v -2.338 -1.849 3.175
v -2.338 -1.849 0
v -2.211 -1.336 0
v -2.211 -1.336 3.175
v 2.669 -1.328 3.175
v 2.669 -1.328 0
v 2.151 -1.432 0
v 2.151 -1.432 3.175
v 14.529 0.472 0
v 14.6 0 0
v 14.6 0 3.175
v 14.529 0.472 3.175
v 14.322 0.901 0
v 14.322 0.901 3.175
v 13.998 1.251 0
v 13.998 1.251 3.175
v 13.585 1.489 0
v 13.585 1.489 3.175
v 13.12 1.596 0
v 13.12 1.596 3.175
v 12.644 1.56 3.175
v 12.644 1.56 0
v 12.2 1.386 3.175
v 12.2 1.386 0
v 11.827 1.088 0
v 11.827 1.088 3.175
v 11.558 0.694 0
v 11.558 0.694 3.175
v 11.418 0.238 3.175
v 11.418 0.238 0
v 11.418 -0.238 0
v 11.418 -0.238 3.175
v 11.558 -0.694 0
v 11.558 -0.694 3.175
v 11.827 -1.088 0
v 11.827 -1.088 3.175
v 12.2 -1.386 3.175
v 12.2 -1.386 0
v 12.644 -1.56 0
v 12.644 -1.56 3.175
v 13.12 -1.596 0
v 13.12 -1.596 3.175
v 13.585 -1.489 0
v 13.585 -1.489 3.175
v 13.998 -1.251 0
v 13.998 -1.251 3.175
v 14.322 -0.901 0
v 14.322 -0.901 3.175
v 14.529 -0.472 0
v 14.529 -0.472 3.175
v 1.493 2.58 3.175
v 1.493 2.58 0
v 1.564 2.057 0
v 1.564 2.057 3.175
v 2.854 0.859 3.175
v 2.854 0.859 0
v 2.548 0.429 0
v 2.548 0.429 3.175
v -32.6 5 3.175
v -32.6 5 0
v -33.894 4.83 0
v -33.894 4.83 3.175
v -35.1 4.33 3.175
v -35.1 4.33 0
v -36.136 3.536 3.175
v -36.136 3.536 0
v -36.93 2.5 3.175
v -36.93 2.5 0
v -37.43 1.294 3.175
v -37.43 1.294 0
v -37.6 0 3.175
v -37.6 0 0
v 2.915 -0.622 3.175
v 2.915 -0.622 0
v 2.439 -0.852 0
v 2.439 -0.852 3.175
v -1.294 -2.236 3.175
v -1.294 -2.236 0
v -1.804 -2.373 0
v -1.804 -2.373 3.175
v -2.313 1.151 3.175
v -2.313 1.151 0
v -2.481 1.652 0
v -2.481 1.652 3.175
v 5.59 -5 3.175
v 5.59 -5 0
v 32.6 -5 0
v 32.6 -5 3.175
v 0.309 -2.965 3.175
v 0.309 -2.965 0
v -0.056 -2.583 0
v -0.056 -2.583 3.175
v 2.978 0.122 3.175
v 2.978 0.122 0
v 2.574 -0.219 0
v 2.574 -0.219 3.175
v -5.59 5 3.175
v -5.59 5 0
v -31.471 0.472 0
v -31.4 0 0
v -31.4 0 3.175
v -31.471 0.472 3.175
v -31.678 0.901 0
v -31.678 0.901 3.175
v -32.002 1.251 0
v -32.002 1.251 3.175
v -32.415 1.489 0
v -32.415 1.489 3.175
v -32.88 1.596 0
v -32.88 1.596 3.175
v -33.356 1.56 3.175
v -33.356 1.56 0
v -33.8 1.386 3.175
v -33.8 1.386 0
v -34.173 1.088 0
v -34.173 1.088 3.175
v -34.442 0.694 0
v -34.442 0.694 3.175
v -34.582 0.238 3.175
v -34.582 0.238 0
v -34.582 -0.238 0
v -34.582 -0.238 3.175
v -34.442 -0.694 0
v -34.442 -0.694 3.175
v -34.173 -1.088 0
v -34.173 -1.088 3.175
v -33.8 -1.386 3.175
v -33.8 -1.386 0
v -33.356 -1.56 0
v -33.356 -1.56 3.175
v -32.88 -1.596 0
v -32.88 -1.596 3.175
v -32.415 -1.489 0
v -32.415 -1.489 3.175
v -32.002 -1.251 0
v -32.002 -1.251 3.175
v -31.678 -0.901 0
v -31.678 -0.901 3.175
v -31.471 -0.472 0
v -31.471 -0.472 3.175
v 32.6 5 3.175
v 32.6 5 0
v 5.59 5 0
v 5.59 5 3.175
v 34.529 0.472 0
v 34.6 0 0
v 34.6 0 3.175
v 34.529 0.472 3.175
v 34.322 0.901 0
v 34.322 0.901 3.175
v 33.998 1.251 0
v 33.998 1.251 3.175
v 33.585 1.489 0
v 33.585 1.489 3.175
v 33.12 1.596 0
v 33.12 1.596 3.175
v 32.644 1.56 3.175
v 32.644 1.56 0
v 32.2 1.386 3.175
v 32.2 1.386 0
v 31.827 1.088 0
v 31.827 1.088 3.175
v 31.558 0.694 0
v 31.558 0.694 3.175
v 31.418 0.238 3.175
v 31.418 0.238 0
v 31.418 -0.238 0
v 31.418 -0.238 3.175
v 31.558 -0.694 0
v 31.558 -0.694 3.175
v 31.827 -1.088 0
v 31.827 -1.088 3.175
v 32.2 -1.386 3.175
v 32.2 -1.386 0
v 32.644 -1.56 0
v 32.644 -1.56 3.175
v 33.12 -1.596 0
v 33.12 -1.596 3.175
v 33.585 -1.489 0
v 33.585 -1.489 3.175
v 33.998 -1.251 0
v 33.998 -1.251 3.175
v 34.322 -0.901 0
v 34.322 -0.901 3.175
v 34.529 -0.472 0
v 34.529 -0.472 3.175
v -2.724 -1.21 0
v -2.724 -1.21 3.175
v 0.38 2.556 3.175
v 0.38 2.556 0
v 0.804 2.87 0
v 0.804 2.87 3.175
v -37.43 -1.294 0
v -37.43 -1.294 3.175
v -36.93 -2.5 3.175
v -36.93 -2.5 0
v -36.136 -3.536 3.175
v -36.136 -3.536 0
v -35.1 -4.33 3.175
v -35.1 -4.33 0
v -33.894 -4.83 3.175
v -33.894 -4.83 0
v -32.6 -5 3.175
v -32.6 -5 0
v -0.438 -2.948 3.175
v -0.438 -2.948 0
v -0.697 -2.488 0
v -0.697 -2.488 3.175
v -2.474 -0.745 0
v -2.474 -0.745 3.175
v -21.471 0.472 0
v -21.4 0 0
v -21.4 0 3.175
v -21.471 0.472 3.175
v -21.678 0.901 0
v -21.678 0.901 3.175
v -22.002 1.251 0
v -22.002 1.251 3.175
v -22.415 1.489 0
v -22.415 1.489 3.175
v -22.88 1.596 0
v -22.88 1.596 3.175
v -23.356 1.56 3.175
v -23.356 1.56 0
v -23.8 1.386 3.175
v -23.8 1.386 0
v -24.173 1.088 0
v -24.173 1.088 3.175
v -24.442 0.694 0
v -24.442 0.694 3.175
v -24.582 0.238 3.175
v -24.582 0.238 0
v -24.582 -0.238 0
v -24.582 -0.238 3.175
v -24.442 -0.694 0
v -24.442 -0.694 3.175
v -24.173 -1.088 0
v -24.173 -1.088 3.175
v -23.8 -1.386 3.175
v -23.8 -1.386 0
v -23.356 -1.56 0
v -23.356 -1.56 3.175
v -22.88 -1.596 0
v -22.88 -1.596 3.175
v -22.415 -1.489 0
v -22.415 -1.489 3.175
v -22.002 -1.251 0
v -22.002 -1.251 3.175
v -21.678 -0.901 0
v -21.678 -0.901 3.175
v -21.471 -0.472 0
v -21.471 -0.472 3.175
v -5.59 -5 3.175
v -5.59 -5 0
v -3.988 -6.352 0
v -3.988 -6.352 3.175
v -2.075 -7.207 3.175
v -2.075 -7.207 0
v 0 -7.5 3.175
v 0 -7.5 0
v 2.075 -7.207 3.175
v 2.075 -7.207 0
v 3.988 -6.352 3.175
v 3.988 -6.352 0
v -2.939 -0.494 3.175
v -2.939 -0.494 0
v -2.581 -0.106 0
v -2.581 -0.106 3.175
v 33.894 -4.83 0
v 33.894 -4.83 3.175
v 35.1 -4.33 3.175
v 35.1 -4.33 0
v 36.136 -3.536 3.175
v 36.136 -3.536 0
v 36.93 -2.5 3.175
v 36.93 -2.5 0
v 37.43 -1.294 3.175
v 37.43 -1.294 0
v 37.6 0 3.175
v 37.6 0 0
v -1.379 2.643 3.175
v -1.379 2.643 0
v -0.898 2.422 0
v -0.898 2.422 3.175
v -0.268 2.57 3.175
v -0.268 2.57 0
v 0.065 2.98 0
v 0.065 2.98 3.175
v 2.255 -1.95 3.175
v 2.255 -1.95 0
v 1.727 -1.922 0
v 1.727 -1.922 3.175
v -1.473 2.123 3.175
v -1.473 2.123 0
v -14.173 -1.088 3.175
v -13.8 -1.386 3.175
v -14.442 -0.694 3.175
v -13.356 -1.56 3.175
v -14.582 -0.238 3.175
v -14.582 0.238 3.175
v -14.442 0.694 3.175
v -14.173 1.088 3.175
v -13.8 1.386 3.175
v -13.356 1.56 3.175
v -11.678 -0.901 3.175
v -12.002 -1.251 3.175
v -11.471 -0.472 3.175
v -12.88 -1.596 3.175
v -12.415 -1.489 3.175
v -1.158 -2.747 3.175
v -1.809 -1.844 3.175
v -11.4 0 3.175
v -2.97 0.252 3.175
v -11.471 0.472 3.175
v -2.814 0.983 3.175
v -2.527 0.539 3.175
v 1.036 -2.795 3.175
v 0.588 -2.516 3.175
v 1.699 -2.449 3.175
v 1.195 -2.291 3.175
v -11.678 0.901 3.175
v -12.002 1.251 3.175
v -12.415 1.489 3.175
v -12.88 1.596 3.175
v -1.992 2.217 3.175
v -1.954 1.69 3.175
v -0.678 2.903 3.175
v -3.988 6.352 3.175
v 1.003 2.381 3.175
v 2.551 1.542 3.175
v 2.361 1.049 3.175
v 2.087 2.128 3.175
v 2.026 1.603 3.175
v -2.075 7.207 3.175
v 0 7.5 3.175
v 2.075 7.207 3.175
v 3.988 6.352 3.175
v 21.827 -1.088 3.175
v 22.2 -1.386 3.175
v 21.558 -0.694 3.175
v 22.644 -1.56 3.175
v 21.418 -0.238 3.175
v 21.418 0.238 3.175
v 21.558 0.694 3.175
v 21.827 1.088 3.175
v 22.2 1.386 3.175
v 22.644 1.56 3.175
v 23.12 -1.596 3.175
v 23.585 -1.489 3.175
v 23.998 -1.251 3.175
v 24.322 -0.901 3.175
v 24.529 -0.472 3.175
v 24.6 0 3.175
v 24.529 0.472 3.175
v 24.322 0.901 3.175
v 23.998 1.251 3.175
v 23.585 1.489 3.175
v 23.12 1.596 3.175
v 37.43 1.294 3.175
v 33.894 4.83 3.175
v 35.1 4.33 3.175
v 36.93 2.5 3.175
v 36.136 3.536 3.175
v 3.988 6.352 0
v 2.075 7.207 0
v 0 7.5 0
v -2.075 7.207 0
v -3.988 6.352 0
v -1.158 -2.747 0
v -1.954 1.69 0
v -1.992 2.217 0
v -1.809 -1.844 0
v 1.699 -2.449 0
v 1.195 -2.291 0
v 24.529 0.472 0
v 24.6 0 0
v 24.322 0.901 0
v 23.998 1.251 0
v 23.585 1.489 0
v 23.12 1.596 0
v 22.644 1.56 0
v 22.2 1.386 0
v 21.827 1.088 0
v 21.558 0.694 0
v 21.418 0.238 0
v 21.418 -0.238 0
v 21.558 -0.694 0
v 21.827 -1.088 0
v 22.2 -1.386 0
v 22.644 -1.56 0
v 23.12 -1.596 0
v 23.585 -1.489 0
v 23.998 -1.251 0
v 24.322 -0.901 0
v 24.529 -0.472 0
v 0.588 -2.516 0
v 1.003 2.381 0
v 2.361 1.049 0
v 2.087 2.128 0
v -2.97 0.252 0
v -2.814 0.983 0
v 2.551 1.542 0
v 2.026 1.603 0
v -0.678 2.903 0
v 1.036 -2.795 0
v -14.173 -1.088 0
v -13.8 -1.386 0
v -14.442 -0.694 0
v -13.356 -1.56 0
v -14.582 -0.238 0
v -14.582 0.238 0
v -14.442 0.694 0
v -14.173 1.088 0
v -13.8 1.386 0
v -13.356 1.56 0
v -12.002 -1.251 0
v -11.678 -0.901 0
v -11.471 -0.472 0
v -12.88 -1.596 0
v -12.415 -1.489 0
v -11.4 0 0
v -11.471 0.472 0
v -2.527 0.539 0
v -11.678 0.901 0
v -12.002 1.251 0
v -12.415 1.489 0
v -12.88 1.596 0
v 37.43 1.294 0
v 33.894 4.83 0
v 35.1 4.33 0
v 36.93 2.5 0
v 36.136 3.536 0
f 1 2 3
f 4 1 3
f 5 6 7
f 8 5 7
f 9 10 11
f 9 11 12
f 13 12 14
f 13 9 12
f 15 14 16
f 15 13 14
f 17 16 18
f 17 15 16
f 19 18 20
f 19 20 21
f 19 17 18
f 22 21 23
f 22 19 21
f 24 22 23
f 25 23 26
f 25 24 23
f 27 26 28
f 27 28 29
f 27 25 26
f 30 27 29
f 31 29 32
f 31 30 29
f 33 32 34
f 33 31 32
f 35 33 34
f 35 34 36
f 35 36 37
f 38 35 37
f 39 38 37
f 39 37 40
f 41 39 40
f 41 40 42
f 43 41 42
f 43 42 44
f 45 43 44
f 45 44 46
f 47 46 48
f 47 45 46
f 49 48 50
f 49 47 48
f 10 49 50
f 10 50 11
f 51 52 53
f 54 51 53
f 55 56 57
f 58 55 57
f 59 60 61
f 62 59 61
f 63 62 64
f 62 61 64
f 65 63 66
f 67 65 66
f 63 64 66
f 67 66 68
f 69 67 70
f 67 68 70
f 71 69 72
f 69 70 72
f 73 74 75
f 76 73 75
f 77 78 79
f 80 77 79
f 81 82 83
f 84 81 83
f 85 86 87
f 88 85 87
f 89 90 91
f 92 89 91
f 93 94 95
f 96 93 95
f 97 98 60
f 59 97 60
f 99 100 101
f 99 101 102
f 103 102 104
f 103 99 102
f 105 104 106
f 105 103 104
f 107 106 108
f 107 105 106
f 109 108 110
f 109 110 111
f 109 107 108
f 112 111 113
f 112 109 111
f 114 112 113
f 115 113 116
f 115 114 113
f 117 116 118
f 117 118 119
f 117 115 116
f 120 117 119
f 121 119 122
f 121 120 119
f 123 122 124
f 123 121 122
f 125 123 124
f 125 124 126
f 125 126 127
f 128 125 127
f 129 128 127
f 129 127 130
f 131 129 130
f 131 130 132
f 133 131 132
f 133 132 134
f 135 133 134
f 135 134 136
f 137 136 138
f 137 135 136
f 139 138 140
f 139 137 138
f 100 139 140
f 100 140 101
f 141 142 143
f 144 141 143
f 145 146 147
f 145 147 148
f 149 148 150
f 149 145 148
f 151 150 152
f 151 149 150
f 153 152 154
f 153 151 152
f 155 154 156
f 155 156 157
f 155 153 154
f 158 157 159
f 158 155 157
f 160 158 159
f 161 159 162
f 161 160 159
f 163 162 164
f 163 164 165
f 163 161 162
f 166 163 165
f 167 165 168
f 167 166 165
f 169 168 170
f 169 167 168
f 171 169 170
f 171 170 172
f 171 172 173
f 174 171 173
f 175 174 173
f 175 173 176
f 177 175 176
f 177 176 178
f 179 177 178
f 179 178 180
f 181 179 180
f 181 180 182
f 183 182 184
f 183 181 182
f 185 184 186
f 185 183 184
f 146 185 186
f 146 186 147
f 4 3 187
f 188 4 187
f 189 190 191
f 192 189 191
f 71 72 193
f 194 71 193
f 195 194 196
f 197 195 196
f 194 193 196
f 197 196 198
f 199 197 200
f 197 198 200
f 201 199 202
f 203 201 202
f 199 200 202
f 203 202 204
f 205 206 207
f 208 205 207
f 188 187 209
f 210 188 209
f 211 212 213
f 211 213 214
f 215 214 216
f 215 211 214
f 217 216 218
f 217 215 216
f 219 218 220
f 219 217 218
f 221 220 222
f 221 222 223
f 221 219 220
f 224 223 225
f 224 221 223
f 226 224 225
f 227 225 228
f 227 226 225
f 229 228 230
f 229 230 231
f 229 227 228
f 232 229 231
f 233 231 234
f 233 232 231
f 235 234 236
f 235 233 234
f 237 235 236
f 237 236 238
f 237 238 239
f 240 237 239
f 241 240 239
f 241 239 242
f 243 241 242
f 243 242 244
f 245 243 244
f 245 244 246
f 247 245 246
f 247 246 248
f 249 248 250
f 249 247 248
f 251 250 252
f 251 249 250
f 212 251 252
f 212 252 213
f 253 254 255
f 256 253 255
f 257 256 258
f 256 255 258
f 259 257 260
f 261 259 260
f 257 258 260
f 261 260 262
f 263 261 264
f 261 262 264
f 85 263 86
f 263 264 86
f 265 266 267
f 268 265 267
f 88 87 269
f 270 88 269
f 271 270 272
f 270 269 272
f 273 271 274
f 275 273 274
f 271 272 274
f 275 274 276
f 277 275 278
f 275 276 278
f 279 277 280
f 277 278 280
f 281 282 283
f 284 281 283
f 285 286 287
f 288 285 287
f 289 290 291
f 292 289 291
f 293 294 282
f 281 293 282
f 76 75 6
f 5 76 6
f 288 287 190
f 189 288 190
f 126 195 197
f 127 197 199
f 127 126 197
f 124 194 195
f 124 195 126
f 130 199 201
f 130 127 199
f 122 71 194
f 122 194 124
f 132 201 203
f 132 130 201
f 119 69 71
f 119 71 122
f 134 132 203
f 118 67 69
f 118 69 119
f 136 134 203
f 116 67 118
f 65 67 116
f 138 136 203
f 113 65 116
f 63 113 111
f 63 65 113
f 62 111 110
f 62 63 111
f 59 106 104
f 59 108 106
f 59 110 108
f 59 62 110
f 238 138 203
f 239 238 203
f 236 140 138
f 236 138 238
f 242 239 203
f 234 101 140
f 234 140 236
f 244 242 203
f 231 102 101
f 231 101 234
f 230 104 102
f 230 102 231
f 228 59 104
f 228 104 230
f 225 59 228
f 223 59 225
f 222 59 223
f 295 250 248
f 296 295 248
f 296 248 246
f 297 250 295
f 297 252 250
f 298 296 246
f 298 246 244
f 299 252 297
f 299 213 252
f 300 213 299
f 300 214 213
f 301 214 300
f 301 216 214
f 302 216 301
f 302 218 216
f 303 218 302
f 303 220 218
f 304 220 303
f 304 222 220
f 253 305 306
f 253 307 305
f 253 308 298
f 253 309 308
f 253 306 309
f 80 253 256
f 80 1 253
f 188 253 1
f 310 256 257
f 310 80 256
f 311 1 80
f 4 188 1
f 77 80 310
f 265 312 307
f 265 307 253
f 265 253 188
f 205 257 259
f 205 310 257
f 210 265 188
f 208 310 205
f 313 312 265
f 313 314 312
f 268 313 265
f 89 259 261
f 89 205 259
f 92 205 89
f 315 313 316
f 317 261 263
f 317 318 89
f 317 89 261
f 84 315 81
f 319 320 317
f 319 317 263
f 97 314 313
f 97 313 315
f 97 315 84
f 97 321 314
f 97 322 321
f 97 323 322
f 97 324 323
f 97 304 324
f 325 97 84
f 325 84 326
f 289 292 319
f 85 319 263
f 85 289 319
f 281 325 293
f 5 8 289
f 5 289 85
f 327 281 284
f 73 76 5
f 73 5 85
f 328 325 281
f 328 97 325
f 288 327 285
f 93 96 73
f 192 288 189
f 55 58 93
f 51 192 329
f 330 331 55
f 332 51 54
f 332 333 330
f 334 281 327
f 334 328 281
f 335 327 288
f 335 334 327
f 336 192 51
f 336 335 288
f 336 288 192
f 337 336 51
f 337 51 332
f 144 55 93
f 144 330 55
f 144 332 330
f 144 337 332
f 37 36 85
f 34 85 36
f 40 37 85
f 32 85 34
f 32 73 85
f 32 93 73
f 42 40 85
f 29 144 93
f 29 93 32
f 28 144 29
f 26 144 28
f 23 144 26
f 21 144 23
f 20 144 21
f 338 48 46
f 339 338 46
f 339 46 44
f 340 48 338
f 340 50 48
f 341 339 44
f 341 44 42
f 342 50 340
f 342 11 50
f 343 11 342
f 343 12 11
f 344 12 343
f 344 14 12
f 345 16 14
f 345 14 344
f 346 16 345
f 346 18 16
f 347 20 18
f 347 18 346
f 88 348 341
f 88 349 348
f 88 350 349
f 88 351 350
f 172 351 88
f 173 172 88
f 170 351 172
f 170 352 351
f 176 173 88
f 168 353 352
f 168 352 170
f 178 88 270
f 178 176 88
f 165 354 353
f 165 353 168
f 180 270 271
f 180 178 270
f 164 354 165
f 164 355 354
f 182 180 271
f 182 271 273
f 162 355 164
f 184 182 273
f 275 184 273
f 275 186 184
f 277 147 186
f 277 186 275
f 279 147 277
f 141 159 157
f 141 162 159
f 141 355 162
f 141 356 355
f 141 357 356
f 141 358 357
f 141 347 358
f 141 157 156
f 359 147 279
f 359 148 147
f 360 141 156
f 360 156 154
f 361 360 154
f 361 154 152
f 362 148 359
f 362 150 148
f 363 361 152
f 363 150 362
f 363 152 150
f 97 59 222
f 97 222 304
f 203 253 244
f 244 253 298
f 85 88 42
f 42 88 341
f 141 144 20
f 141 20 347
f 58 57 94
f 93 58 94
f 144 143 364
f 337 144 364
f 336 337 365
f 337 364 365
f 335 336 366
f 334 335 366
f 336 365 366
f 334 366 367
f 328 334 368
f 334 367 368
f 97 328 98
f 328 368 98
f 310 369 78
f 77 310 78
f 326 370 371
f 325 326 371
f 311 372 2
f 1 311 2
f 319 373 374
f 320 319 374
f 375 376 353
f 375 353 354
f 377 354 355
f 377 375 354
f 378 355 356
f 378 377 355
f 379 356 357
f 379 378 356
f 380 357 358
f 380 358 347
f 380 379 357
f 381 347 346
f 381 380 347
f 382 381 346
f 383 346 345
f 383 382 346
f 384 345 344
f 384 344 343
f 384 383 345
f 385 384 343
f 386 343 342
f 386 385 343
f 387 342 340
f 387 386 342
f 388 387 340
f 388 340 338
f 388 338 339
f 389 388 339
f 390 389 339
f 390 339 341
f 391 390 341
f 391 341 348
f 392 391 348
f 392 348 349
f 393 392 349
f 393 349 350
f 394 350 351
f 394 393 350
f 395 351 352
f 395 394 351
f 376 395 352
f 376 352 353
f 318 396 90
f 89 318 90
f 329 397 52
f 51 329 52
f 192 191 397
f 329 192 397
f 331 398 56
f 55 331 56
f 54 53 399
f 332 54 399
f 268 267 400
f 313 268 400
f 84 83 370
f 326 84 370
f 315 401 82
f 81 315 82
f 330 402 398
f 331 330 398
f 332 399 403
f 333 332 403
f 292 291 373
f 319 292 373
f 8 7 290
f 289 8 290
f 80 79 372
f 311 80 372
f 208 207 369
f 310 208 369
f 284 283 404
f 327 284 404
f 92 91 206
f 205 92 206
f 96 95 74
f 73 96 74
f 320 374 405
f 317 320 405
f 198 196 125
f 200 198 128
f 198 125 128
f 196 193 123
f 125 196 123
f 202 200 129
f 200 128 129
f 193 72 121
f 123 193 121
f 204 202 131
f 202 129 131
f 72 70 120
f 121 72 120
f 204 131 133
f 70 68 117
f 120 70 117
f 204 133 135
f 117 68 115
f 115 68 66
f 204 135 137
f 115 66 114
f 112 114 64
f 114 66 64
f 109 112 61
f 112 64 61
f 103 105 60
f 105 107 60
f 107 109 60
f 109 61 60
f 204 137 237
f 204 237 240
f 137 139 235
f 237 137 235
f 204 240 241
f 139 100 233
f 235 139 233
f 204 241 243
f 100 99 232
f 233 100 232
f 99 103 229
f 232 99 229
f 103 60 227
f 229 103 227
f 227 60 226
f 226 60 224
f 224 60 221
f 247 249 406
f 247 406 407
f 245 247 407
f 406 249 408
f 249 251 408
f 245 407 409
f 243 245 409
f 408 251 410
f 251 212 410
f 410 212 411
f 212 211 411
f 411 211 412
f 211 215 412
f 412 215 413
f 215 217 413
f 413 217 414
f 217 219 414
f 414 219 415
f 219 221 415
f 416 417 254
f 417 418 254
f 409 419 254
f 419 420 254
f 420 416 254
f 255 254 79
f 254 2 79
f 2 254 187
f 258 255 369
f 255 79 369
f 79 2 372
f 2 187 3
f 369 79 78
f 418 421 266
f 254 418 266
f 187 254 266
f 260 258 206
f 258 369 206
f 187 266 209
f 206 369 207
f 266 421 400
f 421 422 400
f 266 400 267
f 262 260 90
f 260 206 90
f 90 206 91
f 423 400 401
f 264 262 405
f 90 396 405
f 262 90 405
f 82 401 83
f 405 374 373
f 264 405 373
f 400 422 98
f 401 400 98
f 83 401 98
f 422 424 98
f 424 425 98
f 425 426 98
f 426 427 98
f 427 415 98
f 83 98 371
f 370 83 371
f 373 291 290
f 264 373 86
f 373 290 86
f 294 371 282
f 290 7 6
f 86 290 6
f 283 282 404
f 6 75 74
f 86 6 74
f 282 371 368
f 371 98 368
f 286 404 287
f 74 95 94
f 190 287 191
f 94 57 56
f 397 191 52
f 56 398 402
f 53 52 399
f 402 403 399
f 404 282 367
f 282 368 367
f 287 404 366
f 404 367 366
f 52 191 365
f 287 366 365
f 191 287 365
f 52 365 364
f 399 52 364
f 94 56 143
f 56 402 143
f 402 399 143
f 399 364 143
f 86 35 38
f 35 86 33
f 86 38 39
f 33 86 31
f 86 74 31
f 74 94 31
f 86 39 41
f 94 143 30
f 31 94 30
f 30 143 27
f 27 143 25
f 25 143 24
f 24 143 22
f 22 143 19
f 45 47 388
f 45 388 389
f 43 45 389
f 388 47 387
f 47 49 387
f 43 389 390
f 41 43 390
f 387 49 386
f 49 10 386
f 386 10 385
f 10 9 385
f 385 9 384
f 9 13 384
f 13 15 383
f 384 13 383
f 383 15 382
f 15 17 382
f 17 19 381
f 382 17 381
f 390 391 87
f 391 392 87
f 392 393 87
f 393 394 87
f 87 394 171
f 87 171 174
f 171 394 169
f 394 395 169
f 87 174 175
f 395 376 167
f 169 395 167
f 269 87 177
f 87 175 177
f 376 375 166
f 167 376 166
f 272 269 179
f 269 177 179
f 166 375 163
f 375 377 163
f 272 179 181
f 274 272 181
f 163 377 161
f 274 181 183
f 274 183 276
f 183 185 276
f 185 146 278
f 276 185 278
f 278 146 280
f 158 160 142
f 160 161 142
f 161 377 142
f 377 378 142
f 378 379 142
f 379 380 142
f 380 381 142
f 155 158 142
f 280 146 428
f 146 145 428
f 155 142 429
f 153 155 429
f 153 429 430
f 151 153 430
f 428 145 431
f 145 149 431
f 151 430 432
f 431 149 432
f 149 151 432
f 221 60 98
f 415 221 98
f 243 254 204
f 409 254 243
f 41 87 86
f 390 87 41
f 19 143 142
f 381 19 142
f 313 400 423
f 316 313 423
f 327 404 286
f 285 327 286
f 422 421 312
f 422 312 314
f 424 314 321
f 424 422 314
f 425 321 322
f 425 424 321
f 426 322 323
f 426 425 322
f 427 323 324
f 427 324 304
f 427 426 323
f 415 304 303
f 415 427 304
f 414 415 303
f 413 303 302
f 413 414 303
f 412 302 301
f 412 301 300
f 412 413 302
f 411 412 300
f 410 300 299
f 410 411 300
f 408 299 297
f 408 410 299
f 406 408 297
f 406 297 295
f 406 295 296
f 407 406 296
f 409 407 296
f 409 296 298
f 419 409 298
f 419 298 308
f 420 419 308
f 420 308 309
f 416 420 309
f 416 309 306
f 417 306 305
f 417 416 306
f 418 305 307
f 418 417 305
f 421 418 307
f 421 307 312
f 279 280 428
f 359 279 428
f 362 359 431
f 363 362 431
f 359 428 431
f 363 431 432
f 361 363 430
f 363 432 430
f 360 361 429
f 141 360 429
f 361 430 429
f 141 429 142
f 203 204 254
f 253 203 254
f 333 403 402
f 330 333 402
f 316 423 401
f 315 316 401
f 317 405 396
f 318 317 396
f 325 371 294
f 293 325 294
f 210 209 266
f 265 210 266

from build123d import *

# Parameters (mm, degrees)
F0_R     = 1.6
F1_DEPTH = 3.175


with BuildPart() as f1:
    # F0 (on Top) → F1 (new body)
    with BuildSketch(Plane.XY):
        with BuildLine():
            ThreePointArc((5.5901699437, 5), (0, 7.5), (-5.5901699437, 5))
            Line((-5.5901699437, 5), (-32.6, 5))
            ThreePointArc((-32.6, 5), (-36.1355339059, 3.5355339059), (-37.6, 0))
            ThreePointArc((-37.6, 0), (-36.1355339059, -3.5355339059), (-32.6, -5))
            Line((-32.6, -5), (-5.5901699437, -5))
            ThreePointArc((-5.5901699437, -5), (0, -7.5), (5.5901699437, -5))
            Line((5.5901699437, -5), (32.6, -5))
            ThreePointArc((32.6, -5), (36.1355339059, -3.5355339059), (37.6, 0))
            ThreePointArc((37.6, 0), (36.1355339059, 3.5355339059), (32.6, 5))
            Line((32.6, 5), (5.5901699437, 5))
        make_face()
        with Locations((-33, 0)):
            Circle(F0_R, mode=Mode.SUBTRACT)
        with Locations((-23, 0)):
            Circle(F0_R, mode=Mode.SUBTRACT)
        with Locations((-13, 0)):
            Circle(F0_R, mode=Mode.SUBTRACT)
        Polygon((-2.3131272616, 1.150841372), (-2.4811892868, 1.651717782), (-1.9542535042, 1.6899369317), (-1.992472654, 2.2168727143), (-1.4725868119, 2.1228475389), (-1.3785616365, 2.6427333809), (-0.8983920744, 2.4223718279), (-0.6780305213, 2.90254139), (-0.2677480588, 2.5696895861), (0.0651037451, 2.9799720486), (0.379719552, 2.555544297), (0.8041473037, 2.8701601039), (1.0033279869, 2.380824761), (1.4926633298, 2.5800054442), (1.5638936344, 2.0565092492), (2.0873898293, 2.1277395538), (2.0261940932, 1.6029756981), (2.5509579489, 1.5417799619), (2.3611813253, 1.0487212884), (2.8542399989, 0.8589446648), (2.547806851, 0.4285718633), (2.9781796525, 0.1221387154), (2.574344302, -0.2185063082), (2.9149893256, -0.6223416587), (2.4391262327, -0.8518549247), (2.6686394987, -1.3277180175), (2.1506488918, -1.4316783634), (2.2546092377, -1.9496689703), (1.7270383715, -1.9215441851), (1.6989135863, -2.4491150513), (1.1949116786, -2.2906723188), (1.0364689461, -2.7946742265), (0.5877042905, -2.5158690862), (0.3088991502, -2.9646337418), (-0.0564307197, -2.5829845462), (-0.4380799154, -2.9483144161), (-0.6970199802, -2.4878015876), (-1.1575328087, -2.7467416524), (-1.2938129119, -2.2363009057), (-1.8042536586, -2.3725810089), (-1.80931082, -1.8442852134), (-2.3376066155, -1.8493423749), (-2.2111230752, -1.3363862984), (-2.7240791517, -1.209902758), (-2.4740023355, -0.7445173173), (-2.9393877762, -0.4944405012), (-2.5814309304, -0.105867575), (-2.9700038565, 0.2520892708), (-2.5266587261, 0.5394342163), (-2.8140036716, 0.9827793468), align=None, mode=Mode.SUBTRACT)
        with Locations((13, 0)):
            Circle(F0_R, mode=Mode.SUBTRACT)
        with Locations((23, 0)):
            Circle(F0_R, mode=Mode.SUBTRACT)
        with Locations((33, 0)):
            Circle(F0_R, mode=Mode.SUBTRACT)
    extrude(amount=F1_DEPTH)


solid = f1.part
